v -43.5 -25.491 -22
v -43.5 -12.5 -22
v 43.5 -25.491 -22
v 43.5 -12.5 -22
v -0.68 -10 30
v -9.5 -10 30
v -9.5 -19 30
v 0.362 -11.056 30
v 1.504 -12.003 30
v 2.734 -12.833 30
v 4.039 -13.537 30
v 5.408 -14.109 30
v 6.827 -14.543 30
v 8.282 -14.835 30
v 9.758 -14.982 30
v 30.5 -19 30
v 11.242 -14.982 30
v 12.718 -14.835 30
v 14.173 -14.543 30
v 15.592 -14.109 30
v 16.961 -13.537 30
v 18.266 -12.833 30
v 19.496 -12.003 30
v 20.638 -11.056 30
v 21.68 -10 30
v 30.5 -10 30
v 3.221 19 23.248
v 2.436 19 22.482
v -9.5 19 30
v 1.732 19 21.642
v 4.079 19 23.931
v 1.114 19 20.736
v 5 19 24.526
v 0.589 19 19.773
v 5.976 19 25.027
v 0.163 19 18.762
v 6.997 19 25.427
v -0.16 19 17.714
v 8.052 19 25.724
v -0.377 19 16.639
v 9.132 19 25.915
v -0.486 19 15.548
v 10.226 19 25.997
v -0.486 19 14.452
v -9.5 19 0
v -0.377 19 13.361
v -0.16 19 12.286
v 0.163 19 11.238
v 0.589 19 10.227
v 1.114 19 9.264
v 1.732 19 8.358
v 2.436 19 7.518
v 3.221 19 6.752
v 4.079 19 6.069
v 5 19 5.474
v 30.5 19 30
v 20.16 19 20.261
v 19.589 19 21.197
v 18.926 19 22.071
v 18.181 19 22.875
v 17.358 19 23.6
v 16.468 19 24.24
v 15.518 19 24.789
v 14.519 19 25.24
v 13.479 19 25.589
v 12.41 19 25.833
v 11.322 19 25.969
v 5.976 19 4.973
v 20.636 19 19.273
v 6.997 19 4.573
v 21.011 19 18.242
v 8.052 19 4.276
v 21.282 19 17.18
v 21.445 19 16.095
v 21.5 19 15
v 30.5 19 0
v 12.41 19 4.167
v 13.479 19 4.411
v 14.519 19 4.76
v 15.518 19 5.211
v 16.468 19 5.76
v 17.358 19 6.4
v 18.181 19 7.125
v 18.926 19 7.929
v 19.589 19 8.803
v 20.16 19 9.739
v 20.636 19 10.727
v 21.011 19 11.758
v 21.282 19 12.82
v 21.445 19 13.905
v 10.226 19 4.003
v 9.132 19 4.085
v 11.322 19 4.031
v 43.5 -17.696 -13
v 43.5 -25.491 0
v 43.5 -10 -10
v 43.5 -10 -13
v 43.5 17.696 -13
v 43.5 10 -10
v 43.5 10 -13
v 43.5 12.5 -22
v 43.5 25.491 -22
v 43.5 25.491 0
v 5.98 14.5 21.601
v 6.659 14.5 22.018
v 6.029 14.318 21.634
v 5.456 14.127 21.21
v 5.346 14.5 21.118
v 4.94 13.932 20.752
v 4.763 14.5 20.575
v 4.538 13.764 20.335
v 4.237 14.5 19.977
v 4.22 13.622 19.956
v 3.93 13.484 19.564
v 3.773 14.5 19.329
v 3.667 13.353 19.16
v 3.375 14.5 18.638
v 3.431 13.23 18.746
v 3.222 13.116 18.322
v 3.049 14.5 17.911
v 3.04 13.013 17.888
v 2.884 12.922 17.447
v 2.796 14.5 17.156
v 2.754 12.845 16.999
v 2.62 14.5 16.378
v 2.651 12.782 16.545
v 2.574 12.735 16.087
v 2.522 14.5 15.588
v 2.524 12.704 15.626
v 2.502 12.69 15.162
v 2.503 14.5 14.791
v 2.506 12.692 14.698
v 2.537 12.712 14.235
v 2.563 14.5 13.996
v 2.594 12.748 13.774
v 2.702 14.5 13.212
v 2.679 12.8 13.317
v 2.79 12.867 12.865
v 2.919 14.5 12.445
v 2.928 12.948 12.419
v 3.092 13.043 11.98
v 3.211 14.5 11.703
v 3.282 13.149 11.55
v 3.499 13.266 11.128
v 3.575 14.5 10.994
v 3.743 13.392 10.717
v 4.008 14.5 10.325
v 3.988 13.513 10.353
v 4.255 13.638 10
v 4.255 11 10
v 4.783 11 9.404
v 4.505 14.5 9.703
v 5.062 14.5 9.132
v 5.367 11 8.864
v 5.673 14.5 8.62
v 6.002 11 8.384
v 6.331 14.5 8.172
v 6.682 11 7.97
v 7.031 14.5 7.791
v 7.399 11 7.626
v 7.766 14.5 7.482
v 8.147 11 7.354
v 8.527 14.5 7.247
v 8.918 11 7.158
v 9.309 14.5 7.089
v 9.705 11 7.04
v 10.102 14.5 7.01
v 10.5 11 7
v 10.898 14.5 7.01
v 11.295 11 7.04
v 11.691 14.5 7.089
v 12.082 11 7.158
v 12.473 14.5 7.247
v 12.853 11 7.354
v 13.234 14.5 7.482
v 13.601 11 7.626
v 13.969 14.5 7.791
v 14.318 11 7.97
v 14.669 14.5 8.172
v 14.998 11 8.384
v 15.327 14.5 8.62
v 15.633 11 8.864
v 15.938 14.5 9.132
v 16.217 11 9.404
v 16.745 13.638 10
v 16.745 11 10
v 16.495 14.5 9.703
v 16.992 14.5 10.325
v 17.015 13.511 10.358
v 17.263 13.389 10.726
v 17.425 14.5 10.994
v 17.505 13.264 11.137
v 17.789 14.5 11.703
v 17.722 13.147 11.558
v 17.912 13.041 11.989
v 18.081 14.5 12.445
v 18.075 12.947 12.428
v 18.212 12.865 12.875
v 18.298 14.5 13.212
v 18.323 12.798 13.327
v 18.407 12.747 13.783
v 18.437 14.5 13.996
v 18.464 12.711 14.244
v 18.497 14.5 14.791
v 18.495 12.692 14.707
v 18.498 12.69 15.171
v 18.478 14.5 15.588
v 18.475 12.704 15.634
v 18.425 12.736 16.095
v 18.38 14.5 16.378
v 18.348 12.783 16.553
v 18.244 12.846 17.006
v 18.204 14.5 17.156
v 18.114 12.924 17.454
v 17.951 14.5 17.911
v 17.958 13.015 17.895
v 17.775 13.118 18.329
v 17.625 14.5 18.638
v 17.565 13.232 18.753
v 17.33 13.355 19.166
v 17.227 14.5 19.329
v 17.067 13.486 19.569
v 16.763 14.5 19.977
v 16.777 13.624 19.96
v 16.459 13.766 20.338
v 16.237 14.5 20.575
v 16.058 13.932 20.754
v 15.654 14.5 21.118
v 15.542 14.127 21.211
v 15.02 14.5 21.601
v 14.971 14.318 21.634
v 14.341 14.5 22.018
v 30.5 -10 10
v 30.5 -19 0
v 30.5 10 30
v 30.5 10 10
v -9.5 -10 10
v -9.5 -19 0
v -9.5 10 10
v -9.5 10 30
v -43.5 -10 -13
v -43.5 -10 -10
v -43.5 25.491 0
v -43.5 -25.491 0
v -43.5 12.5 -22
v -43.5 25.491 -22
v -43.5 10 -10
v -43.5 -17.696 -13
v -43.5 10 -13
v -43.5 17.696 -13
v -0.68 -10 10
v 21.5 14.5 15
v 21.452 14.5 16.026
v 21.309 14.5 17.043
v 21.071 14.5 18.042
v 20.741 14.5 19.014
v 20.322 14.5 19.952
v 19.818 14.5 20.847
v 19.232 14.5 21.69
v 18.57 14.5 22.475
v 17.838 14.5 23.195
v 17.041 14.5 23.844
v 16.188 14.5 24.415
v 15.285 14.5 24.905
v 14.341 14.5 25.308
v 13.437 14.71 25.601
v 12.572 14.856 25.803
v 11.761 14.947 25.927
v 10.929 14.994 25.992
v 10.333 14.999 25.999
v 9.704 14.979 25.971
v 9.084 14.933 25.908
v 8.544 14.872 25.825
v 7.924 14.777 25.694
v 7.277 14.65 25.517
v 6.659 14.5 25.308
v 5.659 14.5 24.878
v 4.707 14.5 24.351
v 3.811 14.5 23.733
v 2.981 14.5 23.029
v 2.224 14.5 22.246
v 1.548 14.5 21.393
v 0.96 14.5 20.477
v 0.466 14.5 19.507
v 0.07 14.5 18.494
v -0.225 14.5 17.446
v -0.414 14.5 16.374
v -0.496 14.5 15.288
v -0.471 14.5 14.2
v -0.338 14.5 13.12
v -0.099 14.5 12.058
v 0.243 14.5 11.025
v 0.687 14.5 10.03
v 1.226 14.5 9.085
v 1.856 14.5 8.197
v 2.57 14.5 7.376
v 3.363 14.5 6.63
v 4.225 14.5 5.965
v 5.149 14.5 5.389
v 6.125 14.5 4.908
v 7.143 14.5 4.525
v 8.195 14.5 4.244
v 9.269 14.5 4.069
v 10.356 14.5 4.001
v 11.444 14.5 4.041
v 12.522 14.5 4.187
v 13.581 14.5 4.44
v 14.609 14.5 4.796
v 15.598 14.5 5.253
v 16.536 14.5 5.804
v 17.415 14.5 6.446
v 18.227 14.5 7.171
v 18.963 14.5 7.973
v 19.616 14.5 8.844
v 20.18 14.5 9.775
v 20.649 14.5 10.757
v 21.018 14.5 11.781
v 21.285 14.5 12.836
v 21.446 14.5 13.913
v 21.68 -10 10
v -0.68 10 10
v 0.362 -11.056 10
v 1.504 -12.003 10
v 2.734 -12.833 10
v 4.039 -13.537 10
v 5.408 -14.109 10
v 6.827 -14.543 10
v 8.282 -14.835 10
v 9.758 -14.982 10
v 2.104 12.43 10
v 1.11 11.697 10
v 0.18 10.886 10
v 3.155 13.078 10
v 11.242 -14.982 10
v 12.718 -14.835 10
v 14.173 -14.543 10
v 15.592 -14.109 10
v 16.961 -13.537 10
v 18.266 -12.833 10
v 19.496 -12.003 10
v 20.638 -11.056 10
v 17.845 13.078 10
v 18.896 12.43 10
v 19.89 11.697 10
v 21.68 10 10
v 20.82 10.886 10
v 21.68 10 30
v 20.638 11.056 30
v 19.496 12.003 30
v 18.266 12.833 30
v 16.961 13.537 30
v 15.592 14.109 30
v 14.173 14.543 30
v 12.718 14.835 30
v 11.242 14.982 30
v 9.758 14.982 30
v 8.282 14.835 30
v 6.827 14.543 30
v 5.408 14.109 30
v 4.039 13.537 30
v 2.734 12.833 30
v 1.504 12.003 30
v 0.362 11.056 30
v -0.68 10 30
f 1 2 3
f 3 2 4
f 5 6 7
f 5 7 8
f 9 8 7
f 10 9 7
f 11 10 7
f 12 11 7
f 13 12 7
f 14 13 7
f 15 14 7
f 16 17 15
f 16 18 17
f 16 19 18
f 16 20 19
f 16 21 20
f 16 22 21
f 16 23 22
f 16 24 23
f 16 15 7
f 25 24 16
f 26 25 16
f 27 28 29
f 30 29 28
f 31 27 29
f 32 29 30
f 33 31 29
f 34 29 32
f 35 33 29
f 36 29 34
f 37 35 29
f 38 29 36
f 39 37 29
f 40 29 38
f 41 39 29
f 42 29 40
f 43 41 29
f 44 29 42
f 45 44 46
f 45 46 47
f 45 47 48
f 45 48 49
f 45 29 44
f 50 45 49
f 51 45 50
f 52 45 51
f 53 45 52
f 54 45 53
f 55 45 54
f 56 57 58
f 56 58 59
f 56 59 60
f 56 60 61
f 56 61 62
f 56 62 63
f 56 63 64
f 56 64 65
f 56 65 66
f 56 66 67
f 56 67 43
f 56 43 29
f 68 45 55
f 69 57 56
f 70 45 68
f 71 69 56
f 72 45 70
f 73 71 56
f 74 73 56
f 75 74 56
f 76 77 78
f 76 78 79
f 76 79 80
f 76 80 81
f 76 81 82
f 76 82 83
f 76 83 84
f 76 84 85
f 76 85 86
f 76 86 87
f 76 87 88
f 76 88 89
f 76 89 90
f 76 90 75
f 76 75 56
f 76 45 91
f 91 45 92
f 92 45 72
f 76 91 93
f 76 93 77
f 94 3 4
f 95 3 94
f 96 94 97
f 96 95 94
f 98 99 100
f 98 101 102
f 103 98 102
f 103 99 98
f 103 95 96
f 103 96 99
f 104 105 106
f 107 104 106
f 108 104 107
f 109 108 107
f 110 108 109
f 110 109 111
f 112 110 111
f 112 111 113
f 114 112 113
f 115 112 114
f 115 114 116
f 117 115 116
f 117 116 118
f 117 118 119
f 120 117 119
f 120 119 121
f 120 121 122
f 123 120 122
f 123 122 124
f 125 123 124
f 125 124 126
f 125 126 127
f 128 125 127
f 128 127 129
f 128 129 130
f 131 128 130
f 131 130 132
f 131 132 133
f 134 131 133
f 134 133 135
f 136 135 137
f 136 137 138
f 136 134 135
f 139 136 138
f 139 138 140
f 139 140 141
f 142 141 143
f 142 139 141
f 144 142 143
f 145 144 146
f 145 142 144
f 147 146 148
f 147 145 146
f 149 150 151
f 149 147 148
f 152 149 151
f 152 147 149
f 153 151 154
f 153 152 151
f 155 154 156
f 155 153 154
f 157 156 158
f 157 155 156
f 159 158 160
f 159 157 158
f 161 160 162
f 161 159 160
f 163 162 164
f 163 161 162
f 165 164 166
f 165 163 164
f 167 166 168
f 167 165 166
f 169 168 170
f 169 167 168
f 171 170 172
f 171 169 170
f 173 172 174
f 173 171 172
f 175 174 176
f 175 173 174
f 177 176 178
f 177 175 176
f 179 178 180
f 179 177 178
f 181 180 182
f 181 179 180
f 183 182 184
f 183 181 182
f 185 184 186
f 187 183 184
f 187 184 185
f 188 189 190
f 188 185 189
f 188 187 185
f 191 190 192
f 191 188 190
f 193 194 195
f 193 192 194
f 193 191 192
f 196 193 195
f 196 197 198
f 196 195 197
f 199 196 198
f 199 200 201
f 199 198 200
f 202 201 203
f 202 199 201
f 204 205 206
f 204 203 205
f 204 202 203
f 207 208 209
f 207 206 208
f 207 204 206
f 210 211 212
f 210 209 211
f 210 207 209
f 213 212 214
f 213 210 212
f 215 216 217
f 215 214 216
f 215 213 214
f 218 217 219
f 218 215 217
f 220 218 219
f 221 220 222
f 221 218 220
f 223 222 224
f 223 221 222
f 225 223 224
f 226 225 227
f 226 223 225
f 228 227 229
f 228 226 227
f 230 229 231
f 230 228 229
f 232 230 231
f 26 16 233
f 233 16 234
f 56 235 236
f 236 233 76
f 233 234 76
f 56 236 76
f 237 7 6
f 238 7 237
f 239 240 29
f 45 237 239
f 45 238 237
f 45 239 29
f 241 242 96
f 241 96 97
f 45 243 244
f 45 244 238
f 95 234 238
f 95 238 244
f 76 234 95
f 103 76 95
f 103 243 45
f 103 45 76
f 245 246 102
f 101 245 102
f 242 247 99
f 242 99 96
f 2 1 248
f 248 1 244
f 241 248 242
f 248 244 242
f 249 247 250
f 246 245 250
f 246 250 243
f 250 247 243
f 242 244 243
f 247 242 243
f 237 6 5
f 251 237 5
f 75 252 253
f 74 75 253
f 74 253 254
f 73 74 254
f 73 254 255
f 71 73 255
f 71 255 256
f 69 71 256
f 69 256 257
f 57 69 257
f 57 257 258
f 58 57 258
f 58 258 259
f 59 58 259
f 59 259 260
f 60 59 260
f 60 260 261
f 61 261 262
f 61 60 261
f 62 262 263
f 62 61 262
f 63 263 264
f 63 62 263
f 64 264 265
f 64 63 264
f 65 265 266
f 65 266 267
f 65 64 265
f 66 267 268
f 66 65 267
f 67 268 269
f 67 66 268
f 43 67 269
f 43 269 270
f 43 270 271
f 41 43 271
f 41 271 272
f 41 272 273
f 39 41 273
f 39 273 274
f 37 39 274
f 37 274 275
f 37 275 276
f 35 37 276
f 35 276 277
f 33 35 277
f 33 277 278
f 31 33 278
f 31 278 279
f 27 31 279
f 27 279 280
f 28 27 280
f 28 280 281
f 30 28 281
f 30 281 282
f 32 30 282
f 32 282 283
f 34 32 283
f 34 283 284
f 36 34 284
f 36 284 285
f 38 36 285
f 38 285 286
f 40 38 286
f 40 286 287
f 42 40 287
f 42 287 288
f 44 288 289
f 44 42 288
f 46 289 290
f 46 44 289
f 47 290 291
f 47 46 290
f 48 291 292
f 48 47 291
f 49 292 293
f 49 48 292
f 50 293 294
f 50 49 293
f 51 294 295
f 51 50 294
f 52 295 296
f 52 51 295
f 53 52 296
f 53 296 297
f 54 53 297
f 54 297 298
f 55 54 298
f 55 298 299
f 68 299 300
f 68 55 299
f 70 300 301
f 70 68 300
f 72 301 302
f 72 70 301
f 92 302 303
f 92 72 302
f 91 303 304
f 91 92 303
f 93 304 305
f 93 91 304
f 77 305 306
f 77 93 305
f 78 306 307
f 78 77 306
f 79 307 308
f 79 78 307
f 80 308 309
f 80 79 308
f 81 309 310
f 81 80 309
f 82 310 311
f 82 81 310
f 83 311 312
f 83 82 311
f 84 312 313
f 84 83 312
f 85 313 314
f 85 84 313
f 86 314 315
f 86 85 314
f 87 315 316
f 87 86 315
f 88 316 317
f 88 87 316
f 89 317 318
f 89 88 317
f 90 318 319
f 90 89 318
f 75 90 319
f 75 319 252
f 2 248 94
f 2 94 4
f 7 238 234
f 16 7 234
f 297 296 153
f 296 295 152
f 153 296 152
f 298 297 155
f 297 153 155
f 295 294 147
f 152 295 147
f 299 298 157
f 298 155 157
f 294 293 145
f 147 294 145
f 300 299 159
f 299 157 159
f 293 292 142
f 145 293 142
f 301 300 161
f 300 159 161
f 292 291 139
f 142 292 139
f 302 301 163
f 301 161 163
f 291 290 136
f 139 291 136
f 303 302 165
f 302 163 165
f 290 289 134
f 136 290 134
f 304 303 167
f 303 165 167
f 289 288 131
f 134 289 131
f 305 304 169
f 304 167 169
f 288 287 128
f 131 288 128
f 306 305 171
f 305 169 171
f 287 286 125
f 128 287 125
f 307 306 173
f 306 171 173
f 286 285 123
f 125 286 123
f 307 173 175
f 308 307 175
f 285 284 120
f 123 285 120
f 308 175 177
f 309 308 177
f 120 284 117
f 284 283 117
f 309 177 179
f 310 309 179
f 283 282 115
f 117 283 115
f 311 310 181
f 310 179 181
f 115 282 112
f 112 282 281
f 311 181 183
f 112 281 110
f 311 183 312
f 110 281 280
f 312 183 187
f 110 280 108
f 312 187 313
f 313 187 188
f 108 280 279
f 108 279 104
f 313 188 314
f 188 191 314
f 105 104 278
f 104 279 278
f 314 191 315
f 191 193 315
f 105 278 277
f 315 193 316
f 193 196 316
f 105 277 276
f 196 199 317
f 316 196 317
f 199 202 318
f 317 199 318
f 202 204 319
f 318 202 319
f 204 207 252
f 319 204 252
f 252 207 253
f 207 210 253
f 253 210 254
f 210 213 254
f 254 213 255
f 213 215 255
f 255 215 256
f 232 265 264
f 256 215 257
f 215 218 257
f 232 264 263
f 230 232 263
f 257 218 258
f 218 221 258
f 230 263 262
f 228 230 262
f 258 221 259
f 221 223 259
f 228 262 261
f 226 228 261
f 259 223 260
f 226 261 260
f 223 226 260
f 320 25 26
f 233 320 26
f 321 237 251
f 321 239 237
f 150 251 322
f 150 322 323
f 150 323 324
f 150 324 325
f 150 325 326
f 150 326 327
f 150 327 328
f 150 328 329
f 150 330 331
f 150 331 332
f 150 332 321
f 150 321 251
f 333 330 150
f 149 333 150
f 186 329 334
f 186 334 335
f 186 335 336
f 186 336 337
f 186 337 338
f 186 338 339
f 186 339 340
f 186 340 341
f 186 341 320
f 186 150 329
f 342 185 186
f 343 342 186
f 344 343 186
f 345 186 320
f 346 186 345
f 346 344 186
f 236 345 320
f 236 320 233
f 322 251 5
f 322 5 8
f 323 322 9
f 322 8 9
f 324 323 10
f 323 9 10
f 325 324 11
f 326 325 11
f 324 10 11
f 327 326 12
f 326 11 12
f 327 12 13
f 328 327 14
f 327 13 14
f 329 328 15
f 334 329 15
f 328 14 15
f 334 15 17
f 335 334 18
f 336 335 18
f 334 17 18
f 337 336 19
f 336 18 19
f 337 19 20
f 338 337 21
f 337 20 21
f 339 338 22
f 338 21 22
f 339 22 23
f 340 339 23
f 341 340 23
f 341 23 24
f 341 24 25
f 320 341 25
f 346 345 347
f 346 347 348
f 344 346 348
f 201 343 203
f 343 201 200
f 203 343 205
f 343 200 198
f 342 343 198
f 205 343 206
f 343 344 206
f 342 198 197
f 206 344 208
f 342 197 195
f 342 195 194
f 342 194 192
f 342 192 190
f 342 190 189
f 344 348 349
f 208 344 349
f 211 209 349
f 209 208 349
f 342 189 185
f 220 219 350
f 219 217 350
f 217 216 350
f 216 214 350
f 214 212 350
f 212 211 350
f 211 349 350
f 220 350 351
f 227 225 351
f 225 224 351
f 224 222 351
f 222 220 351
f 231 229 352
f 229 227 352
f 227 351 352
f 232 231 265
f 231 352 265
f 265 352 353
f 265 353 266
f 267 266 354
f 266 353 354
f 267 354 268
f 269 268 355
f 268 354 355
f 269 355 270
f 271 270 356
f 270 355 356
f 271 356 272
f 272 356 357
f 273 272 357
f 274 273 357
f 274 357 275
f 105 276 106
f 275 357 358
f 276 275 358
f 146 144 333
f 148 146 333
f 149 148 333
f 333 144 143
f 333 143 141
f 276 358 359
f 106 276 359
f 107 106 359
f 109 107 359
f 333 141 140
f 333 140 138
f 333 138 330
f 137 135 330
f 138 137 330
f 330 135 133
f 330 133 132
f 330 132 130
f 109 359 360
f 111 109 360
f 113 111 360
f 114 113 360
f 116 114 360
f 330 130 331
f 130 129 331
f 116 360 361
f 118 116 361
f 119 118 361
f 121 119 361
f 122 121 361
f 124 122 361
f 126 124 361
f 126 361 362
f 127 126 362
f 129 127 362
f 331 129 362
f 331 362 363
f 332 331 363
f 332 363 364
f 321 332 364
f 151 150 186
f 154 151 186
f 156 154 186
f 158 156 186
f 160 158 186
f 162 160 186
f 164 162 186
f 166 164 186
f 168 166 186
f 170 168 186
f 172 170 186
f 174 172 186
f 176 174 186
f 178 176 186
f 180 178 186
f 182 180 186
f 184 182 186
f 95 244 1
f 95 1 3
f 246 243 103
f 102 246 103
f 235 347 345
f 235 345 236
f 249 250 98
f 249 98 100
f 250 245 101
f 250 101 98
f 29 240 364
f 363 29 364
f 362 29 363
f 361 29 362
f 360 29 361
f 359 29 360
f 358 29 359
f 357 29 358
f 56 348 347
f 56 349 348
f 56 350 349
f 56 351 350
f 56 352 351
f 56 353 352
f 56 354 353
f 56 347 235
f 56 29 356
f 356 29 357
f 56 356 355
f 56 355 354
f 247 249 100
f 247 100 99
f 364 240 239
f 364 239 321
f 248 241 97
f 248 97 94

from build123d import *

# Parameters (mm, degrees)
SKETCH1_W         = 87
SKETCH1_H         = 50.982
BASE_YELLOW_DEPTH = 22
SKETCH5_W         = 40
SKETCH5_H         = 38
BASE_RED_DEPTH    = 30
BASE_TURKIZ_DEPTH = 88
SKETCH2_R         = 11
COUNTERBOR_DEPTH  = 4.5
SKETCH7_R         = 15
SKETCH7_W         = 40
SKETCH7_H         = 20
BASE_PURPLE_DEPTH = 20
SKETCH2_5_R       = 8
COUNTERBOR2_DEPTH = 8


with BuildPart() as part:
    # Sketch1 → base-yellow (new body)
    with BuildSketch(Plane.XY):
        Rectangle(SKETCH1_W, SKETCH1_H)
    extrude(amount=-BASE_YELLOW_DEPTH)

    # Sketch5 → base-red (add)
    with BuildSketch(Plane.XY):
        with Locations((10.5, 0)):
            Rectangle(SKETCH5_W, SKETCH5_H)
    extrude(amount=BASE_RED_DEPTH)

    # Sketch8 → base-turkiz (cut, through all)
    with BuildSketch(Plane.ZY.offset(43.5)):
        Polygon((-10, 10), (-10, -10), (-13, -10), (-13, -17.696152423), (-22, -12.5), (-22, 12.5), (-13, 17.696152423), (-13, 10), align=None)
    extrude(amount=-BASE_TURKIZ_DEPTH, mode=Mode.SUBTRACT)

    # Sketch2 → counterbor (cut)
    with BuildSketch(Plane(origin=(0, 19, -19), x_dir=(1, 0, 0), z_dir=(0, -1, 0))):
        with Locations((10.5, 34)):
            Circle(SKETCH2_R)
    extrude(amount=COUNTERBOR_DEPTH, mode=Mode.SUBTRACT)

    # Sketch7 → base-purple (cut)
    with BuildSketch(Plane.XY.offset(30)):
        with Locations((10.5, 0)):
            Circle(SKETCH7_R)
        with Locations((10.5, 0)):
            Rectangle(SKETCH7_W, SKETCH7_H)
    extrude(amount=-BASE_PURPLE_DEPTH, mode=Mode.SUBTRACT)

    # Sketch2<5> → counterbor2 (cut)
    with BuildSketch(Plane(origin=(0, 19, -19), x_dir=(1, 0, 0), z_dir=(0, -1, 0))):
        with Locations((10.5, 34)):
            Circle(SKETCH2_5_R)
    extrude(amount=COUNTERBOR2_DEPTH, mode=Mode.SUBTRACT)


solid = part.part
